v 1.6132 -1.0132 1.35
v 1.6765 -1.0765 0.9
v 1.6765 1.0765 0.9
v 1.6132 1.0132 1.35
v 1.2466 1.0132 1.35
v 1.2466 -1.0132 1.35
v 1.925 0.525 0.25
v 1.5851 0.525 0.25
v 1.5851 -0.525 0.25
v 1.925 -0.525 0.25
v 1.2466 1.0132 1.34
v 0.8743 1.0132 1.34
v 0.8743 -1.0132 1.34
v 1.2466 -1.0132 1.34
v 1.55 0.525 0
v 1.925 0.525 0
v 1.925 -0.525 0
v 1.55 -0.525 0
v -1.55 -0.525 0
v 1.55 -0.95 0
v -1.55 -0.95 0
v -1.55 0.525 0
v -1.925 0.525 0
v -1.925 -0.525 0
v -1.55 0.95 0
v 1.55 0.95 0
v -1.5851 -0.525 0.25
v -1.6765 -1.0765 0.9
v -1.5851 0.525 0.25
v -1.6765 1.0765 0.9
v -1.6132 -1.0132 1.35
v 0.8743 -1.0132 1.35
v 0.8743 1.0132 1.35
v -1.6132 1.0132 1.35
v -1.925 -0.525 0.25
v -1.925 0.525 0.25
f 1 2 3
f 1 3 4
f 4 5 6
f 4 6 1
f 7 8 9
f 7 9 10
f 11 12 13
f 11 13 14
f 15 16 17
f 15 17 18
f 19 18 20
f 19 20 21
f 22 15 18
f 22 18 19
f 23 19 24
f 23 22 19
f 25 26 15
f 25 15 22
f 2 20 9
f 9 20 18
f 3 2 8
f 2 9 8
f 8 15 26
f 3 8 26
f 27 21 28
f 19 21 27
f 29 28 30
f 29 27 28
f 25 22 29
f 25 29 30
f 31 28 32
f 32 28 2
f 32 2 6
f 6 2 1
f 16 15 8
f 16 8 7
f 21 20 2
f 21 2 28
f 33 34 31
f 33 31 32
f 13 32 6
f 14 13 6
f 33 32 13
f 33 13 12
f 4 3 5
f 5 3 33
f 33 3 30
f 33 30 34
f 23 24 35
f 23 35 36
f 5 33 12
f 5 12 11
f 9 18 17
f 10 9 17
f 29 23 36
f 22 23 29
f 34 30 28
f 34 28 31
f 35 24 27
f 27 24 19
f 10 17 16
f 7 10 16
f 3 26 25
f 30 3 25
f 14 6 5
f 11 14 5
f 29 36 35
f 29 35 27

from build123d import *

# Parameters (mm, degrees)
CROQUIS1_W              = 3.85
CROQUIS1_H              = 1.05
SALIENTE_EXTRUIR1_DEPTH = 0.25
CROQUIS2_W              = 3.1
CROQUIS2_H              = 1.9
SALIENTE_EXTRUIR2_DEPTH = 0.9
SALIENTE_EXTRUIR2_DRAFT = 8
CROQUIS3_W              = 3.352973502
CROQUIS3_H              = 2.152973502
SALIENTE_EXTRUIR3_DEPTH = 0.45
SALIENTE_EXTRUIR3_TAPER = 8
CROQUIS4_W              = 0.372299527
CROQUIS4_H              = 2.026486752
CORTAR_EXTRUIR1_DEPTH   = 0.01


with BuildPart() as part:
    # Croquis1 → Saliente-Extruir1 (new body)
    with BuildSketch(Plane.XY):
        Rectangle(CROQUIS1_W, CROQUIS1_H)
    extrude(amount=SALIENTE_EXTRUIR1_DEPTH)


with BuildPart() as saliente_extruir2_tool:
    # Croquis2 → Saliente-Extruir2 (with draft: the straight prism first)
    with BuildSketch(Plane(origin=(0, 0, 0), x_dir=(-1, 0, 0), z_dir=(0, 0, -1))):
        Rectangle(CROQUIS2_W, CROQUIS2_H)
    extrude(amount=-SALIENTE_EXTRUIR2_DEPTH)
    # Saliente-Extruir2: the draft: its side faces are tilted about the plane it starts from
    saliente_extruir2_sides = [saliente_extruir2_tool.faces().sort_by_distance(p)[0] for p in [
        (0, 0.95, 0.45),
        (1.55, 0, 0.45),
        (0, -0.95, 0.45),
        (-1.55, 0, 0.45),
    ]]
    draft(saliente_extruir2_sides, Plane(origin=(0, 0, 0), x_dir=(-1, 0, 0), z_dir=(0, 0, -1)), SALIENTE_EXTRUIR2_DRAFT)


with BuildPart() as part_1:
    add(part.part)

    # Saliente-Extruir2: add saliente_extruir2_tool
    add(saliente_extruir2_tool.part)

    # Croquis3 → Saliente-Extruir3 (add)
    with BuildSketch(Plane.XY.offset(0.9)):
        Rectangle(CROQUIS3_W, CROQUIS3_H)
    extrude(amount=SALIENTE_EXTRUIR3_DEPTH, taper=SALIENTE_EXTRUIR3_TAPER)

    # Croquis4 → Cortar-Extruir1 (cut)
    with BuildSketch(Plane.XY.offset(1.35)):
        with Locations((1.060489564, 0)):
            Rectangle(CROQUIS4_W, CROQUIS4_H)
    extrude(amount=-CORTAR_EXTRUIR1_DEPTH, mode=Mode.SUBTRACT)


solid = part_1.part
